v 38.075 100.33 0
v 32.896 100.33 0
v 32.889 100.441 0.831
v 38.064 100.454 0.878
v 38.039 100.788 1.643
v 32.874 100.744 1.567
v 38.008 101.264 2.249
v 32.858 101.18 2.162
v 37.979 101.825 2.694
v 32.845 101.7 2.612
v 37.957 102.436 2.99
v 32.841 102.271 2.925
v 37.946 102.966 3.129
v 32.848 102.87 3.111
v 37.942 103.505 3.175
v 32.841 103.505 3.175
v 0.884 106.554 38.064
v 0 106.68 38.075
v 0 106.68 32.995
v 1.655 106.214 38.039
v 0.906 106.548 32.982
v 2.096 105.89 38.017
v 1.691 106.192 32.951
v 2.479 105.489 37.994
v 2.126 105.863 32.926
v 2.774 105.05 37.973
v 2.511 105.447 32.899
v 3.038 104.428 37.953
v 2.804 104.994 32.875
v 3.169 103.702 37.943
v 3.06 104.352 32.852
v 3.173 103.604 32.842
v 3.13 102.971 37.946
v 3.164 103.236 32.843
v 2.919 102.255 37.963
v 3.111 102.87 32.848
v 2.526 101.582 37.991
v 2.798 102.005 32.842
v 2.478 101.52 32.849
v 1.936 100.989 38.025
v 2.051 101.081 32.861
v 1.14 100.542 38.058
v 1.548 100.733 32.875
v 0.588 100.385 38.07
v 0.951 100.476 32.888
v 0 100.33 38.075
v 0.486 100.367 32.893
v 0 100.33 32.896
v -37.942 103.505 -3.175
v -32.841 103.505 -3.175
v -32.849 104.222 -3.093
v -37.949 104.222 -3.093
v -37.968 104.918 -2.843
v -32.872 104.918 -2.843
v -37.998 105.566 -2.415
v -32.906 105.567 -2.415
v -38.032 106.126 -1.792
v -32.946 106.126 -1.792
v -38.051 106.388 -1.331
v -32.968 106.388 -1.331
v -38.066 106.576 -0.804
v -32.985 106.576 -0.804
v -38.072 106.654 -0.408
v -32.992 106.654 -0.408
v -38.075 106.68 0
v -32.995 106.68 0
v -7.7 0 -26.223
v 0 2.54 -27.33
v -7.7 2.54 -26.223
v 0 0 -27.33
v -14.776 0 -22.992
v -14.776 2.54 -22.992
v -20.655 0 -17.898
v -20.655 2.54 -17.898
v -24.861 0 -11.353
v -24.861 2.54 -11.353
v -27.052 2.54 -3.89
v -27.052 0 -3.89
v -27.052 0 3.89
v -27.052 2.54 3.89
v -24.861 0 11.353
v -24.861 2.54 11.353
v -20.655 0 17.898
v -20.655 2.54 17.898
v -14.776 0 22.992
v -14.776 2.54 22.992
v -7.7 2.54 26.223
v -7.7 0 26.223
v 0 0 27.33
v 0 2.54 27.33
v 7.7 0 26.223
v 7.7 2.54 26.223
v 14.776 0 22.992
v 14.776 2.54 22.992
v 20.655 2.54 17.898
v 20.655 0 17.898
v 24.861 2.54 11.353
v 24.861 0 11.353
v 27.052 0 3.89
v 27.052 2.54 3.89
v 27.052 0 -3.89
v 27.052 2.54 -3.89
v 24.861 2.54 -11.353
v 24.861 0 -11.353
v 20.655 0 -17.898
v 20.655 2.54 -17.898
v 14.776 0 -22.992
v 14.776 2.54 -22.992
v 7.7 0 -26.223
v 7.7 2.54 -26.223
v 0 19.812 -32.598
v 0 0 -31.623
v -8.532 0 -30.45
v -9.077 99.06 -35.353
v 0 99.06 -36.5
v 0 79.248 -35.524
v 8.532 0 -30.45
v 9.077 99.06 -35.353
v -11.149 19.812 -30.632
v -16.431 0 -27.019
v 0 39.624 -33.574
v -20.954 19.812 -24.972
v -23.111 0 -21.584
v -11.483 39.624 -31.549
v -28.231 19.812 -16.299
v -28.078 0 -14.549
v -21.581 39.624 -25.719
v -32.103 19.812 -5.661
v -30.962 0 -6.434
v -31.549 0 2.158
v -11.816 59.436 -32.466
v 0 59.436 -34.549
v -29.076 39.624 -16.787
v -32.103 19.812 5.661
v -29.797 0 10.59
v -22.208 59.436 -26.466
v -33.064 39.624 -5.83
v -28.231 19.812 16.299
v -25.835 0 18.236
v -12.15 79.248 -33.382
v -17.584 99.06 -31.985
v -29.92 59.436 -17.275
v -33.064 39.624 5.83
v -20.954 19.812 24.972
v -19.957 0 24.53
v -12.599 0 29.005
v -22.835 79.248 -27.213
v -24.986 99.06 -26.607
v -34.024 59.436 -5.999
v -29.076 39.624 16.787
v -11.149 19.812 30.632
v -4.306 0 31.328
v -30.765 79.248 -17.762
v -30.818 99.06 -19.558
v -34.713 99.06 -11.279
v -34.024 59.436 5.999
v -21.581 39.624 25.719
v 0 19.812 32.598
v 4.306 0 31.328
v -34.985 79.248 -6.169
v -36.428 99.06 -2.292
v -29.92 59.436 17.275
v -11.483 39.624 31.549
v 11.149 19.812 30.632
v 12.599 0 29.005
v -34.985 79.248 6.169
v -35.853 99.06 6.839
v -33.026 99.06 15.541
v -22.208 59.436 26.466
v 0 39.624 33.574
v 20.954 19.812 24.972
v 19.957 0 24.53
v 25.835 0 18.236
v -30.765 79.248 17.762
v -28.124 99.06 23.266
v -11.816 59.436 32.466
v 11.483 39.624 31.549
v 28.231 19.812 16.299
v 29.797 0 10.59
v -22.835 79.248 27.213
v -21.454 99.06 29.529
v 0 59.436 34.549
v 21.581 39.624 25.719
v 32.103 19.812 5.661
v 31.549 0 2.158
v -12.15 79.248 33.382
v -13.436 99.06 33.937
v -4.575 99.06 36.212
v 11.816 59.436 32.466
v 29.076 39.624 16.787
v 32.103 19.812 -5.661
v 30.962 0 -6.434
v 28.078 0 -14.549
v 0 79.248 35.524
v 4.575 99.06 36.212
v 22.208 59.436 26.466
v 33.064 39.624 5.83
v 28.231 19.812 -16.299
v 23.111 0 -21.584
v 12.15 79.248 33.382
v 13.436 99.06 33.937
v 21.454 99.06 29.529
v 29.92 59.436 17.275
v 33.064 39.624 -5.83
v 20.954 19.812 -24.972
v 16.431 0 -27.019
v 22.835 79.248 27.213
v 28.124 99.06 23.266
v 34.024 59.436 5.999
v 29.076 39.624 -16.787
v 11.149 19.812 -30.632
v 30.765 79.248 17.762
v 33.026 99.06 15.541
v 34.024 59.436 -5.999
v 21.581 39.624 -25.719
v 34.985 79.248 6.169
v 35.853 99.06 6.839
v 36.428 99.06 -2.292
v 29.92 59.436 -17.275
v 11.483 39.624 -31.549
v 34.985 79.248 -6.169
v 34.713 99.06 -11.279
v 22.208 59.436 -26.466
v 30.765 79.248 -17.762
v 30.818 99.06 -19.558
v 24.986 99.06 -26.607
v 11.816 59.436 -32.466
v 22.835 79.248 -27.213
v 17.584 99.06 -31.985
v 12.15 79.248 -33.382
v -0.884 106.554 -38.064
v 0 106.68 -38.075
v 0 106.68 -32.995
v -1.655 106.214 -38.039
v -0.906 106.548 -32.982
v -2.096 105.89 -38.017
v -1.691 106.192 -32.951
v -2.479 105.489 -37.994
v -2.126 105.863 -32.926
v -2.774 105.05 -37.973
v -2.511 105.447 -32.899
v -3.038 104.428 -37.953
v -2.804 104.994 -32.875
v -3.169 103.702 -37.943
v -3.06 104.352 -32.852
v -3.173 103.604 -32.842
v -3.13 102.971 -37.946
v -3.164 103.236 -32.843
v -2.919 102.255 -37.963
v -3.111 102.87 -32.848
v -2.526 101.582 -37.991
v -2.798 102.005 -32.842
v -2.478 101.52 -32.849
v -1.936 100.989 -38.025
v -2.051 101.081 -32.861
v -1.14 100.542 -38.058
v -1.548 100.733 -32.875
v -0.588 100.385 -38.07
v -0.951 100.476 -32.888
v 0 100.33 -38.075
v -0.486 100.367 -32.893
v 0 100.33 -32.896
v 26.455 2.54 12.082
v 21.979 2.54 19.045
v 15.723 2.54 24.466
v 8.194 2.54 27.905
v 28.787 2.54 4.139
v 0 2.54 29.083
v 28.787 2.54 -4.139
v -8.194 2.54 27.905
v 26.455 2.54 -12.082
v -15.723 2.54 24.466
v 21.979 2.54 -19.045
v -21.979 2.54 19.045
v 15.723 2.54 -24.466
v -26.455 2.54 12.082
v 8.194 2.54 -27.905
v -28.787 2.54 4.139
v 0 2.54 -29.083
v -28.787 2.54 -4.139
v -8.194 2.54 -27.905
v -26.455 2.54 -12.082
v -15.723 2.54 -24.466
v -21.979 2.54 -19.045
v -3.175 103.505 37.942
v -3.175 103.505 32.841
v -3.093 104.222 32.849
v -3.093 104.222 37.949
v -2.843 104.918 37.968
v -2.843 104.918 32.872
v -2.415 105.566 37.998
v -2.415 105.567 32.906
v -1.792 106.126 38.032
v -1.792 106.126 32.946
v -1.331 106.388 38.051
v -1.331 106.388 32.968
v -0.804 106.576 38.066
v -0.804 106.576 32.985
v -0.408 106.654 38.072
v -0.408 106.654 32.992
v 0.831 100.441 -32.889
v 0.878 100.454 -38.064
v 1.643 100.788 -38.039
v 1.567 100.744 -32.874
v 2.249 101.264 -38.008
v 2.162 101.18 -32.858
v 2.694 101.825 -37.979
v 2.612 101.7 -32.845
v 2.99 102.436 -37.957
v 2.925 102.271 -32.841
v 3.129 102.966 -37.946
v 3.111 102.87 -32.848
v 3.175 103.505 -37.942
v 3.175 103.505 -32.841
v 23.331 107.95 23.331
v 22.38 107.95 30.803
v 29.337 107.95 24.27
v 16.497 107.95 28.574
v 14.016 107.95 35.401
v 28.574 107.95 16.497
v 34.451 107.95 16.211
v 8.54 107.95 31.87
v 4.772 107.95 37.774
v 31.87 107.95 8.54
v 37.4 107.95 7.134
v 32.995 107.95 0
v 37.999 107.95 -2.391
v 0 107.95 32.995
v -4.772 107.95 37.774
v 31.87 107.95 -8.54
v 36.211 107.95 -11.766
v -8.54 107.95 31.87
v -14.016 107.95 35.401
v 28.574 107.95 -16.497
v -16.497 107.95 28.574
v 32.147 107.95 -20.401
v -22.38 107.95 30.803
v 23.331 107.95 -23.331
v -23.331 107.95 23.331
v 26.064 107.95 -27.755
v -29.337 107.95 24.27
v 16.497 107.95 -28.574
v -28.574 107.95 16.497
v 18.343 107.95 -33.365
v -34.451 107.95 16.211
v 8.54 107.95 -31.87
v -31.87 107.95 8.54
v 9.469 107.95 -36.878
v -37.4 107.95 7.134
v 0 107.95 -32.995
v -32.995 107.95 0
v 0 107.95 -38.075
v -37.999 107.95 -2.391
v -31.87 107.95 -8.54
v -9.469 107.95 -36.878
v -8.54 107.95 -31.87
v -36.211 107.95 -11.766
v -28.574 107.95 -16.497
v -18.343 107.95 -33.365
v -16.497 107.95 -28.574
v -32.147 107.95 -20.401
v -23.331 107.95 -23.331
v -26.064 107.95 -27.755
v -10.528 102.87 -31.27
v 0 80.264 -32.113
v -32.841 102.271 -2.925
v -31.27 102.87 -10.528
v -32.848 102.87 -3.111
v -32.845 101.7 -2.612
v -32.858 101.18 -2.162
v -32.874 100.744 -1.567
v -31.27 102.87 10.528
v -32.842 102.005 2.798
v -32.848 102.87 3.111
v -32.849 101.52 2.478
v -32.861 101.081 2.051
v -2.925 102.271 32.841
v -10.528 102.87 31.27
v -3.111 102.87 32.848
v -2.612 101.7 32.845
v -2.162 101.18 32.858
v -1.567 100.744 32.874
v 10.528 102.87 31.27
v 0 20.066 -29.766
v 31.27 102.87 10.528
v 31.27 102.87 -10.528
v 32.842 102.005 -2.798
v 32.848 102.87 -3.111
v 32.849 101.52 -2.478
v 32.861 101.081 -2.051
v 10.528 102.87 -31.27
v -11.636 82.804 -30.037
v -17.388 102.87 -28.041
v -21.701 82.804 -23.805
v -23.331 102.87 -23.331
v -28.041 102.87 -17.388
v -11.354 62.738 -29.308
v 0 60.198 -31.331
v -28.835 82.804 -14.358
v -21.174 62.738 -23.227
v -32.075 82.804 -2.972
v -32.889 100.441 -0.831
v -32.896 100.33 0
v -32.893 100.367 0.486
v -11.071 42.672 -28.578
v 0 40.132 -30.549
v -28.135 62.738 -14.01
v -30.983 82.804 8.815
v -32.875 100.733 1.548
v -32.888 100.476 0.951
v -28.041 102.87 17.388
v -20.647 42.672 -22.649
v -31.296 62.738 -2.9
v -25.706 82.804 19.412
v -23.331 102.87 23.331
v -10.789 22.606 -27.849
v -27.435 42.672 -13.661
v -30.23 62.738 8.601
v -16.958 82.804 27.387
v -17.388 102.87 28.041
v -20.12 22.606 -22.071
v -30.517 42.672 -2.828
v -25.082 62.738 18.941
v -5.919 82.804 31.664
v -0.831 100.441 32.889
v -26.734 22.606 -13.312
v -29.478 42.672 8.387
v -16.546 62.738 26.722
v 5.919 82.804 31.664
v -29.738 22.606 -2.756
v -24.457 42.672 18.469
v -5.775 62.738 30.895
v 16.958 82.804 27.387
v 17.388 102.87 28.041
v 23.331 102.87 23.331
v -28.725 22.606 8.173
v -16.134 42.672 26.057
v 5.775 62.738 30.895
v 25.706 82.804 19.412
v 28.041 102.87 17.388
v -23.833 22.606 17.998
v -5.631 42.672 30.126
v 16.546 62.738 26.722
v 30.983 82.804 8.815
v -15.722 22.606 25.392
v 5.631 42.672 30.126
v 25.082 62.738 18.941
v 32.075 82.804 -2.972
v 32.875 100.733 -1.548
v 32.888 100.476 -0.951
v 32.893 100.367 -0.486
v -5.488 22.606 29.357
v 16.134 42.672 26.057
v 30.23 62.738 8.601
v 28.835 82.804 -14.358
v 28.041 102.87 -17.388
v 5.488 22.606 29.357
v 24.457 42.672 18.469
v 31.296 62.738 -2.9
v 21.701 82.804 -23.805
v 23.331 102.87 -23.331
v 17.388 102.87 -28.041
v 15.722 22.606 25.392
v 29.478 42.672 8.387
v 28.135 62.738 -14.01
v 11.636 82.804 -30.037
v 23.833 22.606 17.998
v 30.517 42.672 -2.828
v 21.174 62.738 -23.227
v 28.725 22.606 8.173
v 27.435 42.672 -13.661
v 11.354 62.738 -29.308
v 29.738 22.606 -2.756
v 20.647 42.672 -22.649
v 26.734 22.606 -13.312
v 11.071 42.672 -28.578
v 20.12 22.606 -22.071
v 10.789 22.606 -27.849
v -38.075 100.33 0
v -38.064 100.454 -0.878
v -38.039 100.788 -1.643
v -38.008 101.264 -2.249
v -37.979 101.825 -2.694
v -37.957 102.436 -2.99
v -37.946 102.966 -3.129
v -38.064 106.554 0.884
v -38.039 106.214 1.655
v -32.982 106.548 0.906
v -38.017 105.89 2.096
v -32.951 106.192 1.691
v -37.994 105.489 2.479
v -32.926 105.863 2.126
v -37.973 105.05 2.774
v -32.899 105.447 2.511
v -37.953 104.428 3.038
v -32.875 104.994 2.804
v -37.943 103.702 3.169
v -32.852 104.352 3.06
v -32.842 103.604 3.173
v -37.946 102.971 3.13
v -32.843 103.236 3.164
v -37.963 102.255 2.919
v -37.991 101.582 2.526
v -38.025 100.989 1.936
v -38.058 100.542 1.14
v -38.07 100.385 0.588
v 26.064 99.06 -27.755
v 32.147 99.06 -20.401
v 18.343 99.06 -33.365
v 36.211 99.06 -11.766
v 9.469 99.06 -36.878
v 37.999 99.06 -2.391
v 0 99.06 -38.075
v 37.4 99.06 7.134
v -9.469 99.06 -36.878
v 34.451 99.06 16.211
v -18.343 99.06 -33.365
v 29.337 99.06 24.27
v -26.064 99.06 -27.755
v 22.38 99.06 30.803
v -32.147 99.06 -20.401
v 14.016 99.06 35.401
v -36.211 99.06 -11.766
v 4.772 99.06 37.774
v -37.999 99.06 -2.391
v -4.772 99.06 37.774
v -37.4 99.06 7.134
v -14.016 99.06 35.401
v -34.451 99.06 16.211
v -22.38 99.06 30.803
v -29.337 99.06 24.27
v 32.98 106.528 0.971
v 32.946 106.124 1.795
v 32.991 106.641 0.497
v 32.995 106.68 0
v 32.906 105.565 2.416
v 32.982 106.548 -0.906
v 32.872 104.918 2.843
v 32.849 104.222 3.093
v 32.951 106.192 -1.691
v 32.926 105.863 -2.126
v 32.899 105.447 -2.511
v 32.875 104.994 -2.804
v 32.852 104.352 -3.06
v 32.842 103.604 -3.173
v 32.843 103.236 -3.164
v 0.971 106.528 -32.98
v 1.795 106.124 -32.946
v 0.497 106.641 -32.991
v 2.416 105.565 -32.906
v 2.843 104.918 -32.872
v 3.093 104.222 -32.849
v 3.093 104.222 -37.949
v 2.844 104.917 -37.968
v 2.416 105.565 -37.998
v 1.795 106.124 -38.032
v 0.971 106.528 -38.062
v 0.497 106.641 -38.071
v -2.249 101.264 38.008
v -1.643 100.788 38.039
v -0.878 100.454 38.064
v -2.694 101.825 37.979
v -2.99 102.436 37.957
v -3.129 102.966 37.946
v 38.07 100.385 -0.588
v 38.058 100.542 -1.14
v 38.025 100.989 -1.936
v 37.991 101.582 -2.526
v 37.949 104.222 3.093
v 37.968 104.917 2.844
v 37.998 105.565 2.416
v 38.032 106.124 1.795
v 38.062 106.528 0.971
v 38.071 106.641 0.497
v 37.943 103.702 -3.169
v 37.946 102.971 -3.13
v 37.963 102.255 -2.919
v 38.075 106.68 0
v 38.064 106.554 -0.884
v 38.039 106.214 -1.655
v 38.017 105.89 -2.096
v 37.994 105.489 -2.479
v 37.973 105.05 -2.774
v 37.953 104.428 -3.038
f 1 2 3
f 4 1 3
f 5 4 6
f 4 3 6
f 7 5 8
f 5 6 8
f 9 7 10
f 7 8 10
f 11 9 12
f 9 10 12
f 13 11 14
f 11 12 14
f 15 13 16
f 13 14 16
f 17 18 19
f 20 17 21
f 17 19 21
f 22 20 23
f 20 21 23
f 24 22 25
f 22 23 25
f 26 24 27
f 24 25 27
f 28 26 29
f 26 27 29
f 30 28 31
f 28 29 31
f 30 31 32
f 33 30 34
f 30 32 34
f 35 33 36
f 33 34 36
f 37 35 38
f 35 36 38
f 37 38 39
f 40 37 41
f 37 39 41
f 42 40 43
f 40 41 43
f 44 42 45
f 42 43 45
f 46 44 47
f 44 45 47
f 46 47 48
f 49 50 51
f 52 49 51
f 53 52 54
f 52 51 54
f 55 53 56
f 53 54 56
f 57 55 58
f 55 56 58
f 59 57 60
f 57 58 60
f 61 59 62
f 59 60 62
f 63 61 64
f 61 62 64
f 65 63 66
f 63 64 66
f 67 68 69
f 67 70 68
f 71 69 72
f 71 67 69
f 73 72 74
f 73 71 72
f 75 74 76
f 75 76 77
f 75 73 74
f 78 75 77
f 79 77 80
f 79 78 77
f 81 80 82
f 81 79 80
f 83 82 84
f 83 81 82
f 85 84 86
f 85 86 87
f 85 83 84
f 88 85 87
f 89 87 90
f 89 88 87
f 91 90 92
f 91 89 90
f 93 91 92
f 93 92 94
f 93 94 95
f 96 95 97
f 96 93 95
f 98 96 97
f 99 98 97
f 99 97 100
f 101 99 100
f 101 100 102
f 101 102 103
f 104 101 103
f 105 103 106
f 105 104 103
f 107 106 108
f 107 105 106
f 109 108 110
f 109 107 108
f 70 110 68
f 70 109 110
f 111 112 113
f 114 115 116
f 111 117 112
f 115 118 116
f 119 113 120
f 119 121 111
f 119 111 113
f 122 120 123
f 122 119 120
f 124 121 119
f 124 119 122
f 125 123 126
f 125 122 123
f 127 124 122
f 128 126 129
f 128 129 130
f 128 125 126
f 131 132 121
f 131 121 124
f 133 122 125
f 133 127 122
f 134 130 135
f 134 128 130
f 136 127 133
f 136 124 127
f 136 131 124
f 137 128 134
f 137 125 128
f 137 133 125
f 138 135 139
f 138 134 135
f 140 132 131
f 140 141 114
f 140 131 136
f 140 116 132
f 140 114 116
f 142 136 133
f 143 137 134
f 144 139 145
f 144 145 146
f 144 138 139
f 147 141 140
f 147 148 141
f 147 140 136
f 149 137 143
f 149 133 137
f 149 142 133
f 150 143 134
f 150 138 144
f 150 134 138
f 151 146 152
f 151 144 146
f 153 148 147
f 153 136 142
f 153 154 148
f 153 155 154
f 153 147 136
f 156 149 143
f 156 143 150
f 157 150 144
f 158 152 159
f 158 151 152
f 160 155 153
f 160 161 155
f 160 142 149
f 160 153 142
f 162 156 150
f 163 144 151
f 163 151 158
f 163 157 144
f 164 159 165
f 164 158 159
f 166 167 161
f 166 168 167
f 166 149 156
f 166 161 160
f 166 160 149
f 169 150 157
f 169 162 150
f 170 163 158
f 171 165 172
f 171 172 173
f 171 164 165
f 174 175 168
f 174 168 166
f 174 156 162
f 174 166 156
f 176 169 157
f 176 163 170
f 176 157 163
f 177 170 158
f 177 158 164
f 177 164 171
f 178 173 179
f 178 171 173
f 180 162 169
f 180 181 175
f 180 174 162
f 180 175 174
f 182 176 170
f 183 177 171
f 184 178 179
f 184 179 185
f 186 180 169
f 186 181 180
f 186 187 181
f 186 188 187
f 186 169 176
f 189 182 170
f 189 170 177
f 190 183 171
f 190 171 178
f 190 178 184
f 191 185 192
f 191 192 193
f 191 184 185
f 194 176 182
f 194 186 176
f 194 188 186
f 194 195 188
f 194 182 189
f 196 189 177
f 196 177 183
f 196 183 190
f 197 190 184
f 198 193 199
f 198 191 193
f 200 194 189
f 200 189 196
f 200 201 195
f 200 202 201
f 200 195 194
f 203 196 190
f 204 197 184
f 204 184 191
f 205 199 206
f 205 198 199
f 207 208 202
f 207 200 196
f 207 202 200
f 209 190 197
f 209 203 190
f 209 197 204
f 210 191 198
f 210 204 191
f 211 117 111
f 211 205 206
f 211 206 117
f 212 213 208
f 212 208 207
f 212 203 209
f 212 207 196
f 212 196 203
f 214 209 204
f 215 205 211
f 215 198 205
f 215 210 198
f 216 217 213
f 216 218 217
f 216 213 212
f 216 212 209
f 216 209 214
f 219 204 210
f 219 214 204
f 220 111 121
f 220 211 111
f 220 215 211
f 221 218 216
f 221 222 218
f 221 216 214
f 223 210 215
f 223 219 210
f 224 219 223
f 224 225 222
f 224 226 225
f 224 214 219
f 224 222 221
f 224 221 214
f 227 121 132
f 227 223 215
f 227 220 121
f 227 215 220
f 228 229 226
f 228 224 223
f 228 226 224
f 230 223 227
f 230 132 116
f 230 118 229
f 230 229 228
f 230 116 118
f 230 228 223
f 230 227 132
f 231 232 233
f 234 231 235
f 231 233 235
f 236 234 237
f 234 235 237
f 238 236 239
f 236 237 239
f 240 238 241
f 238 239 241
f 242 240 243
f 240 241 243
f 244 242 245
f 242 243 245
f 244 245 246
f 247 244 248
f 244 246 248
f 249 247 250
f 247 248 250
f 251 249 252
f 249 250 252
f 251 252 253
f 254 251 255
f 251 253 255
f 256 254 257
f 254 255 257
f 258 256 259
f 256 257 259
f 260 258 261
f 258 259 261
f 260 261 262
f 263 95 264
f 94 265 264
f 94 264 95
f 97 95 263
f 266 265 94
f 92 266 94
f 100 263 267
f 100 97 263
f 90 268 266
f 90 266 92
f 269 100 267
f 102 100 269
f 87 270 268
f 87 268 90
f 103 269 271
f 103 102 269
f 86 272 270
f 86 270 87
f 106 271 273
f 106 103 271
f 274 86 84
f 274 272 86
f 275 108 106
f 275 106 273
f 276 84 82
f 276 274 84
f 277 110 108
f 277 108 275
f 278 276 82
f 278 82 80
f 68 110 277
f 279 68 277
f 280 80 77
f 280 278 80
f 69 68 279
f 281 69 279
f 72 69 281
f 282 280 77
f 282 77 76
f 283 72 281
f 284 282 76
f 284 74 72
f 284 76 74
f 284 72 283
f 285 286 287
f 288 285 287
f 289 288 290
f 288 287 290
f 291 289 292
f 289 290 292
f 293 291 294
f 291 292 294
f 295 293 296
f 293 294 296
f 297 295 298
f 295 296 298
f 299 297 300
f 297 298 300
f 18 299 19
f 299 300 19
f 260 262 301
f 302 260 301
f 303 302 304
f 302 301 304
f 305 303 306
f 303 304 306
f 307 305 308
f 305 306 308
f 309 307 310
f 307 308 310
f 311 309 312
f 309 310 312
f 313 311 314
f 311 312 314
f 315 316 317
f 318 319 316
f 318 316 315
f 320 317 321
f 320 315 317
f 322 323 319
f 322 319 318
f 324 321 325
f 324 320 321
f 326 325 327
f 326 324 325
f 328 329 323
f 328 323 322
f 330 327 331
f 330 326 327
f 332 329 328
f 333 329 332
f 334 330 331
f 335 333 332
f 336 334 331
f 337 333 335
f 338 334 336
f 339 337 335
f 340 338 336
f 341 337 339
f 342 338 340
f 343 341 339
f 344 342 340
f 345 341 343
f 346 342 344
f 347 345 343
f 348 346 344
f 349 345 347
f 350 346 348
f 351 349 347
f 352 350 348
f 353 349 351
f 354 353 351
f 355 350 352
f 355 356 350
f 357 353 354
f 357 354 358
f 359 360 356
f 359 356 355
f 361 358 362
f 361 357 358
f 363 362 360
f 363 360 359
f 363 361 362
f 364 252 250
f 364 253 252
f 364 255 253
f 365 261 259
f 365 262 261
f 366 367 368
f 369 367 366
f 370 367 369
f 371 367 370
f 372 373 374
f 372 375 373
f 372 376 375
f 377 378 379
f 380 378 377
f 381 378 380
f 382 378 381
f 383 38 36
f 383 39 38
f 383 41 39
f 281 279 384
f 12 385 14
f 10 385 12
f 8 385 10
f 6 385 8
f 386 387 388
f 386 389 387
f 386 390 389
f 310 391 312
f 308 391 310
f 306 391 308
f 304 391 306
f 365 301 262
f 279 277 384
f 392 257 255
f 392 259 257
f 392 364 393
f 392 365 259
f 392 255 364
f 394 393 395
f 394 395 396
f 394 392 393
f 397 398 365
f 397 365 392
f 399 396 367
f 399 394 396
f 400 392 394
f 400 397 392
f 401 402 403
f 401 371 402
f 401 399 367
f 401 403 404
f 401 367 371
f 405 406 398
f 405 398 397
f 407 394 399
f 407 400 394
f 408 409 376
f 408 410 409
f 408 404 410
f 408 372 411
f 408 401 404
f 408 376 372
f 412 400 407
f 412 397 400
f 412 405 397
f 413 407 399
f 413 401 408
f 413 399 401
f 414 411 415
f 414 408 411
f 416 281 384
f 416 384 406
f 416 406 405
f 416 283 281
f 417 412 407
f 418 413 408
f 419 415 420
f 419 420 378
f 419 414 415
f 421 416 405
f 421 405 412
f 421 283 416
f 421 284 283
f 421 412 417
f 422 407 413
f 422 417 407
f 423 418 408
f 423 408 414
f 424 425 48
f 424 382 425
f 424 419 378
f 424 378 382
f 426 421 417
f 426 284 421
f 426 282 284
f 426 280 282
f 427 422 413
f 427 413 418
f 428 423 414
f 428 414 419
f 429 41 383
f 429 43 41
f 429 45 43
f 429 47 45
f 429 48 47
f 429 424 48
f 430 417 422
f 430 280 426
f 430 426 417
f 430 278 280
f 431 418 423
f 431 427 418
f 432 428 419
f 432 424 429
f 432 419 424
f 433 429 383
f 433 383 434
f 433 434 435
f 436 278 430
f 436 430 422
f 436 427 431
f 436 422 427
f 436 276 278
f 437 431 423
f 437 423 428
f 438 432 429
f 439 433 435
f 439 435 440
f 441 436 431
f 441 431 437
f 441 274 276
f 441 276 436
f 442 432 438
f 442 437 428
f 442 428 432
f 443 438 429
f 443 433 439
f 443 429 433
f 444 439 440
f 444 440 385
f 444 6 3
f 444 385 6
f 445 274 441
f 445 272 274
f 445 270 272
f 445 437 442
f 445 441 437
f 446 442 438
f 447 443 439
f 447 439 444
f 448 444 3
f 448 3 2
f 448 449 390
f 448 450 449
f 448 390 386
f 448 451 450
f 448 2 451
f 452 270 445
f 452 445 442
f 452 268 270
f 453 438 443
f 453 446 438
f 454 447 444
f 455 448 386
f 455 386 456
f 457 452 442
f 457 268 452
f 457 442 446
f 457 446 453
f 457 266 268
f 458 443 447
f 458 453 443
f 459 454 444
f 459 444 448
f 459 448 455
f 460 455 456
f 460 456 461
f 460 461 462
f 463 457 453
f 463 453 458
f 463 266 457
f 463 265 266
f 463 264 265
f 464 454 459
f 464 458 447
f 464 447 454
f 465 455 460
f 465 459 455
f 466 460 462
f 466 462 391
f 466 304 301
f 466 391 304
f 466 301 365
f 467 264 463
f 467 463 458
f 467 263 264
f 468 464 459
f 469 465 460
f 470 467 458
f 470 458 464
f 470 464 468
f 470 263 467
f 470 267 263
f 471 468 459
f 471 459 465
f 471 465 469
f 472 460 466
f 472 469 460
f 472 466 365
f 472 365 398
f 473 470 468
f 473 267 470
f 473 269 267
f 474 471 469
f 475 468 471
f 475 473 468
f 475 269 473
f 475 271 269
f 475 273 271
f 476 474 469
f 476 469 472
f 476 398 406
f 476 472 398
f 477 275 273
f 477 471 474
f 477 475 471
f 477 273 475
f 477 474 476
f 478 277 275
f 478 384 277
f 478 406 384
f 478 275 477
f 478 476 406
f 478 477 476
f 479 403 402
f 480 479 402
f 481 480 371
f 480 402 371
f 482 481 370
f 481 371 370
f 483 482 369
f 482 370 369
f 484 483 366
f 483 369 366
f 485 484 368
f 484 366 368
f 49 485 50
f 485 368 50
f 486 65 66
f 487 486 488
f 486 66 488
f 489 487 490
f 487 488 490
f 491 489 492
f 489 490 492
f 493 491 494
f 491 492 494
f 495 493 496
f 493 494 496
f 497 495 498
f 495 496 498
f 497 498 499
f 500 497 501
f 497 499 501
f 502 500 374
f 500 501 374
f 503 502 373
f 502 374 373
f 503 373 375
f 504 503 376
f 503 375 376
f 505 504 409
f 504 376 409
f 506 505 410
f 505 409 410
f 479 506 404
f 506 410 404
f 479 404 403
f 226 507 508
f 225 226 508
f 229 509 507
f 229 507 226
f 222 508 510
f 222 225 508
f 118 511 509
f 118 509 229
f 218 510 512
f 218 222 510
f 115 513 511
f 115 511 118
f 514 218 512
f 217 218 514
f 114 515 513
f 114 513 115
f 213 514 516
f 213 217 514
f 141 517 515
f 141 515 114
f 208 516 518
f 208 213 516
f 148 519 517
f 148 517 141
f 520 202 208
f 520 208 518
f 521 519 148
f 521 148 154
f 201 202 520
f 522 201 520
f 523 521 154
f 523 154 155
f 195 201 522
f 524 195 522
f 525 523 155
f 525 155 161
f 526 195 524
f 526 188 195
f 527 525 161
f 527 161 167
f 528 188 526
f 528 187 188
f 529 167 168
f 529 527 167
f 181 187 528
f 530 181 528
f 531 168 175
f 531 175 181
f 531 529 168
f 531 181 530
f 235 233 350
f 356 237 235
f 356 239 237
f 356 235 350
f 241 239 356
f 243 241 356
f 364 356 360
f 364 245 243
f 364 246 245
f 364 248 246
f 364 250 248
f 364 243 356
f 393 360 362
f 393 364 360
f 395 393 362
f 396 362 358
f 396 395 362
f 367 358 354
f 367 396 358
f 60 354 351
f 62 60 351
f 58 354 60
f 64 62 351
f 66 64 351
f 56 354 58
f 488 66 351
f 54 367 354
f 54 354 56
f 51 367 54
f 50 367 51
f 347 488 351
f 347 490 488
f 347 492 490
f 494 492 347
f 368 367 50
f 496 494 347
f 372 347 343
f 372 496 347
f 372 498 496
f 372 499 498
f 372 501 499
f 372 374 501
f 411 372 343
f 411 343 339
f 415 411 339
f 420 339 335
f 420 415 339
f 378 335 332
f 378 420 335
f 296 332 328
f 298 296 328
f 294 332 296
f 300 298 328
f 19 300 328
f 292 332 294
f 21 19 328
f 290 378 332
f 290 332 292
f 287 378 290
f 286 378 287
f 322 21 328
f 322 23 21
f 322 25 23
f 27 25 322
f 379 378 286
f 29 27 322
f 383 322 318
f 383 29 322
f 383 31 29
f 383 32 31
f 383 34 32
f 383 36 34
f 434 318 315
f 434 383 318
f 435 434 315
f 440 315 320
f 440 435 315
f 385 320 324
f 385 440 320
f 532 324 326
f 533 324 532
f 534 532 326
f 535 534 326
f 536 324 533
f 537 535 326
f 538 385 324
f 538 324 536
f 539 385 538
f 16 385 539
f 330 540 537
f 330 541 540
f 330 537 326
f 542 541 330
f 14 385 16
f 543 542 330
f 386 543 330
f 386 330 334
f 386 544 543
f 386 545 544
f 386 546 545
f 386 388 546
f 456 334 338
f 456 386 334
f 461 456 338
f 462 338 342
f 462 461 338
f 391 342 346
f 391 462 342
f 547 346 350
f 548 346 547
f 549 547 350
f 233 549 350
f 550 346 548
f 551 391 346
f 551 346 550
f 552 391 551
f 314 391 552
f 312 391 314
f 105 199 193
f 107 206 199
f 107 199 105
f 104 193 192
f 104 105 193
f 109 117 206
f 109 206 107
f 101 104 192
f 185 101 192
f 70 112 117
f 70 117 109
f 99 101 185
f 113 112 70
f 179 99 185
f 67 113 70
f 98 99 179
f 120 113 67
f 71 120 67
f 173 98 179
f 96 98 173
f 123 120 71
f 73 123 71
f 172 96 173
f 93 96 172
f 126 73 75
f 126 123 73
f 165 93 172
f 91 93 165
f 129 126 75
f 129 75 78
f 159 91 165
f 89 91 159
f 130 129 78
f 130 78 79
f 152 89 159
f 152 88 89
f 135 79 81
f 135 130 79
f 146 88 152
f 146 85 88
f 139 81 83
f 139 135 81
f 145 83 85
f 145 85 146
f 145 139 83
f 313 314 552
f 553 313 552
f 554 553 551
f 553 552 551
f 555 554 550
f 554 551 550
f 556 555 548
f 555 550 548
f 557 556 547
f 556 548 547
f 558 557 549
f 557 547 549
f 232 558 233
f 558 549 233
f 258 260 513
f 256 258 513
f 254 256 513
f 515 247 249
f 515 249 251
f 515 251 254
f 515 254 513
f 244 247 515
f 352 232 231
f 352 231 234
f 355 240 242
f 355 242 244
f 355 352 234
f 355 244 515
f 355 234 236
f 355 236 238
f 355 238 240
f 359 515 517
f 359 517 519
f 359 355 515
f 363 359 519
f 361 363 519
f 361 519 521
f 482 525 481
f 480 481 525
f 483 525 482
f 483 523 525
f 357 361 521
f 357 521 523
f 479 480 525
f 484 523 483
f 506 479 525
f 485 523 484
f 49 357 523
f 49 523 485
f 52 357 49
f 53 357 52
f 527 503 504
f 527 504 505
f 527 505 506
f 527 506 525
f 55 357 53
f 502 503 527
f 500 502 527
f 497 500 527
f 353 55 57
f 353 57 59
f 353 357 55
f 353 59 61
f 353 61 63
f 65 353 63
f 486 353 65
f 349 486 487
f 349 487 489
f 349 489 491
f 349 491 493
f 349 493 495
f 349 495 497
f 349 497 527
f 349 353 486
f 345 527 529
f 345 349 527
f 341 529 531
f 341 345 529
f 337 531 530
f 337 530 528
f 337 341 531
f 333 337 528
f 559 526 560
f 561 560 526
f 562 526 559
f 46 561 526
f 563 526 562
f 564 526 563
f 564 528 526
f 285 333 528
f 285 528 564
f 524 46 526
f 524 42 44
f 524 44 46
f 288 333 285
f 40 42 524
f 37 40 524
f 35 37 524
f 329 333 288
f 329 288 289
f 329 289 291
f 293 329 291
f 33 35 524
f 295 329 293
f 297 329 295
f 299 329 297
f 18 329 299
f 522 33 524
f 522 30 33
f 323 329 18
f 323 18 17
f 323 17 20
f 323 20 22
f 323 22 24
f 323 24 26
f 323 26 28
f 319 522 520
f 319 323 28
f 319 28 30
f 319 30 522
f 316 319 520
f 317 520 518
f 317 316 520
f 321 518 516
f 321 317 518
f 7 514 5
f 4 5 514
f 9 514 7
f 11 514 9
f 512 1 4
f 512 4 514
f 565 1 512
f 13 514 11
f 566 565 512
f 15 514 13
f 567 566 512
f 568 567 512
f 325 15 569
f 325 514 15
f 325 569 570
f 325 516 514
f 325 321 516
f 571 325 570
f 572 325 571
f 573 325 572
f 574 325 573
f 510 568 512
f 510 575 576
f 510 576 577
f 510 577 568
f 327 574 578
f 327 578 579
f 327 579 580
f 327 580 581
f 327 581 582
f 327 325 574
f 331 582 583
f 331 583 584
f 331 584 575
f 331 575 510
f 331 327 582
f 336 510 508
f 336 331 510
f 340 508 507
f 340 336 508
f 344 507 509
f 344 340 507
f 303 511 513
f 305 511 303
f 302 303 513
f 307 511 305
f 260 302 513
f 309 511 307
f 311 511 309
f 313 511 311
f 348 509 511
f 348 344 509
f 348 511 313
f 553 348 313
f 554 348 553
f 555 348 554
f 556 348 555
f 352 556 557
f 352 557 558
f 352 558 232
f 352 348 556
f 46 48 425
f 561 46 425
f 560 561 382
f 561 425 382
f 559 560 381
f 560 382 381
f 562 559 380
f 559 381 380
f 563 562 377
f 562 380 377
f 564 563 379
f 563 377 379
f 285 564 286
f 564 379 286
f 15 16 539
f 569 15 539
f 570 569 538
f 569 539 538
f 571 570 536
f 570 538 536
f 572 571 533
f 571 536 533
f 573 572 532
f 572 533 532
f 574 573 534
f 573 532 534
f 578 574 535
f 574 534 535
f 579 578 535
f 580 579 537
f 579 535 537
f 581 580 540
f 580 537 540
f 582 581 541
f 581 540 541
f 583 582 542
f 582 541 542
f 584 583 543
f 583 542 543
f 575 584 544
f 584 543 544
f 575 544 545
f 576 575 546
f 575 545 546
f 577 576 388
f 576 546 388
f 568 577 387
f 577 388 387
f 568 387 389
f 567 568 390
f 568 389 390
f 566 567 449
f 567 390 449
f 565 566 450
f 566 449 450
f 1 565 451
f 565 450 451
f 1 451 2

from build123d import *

# Parameters (mm, degrees)
CUT_EXTRUDE2_DEPTH = 45.212
CIRPATTERN2_COUNT  = 4


with BuildPart() as part:
    # Sketch2 → Revolve2 (revolve)
    with BuildSketch(Plane.XY, mode=Mode.PRIVATE) as revolve2_sk:
        Polygon((27.3304, 2.54), (27.3304, 0), (31.623, 0), (36.4998, 99.06), (38.0746, 99.06), (38.0746, 107.95), (32.9946, 107.95), (32.9946, 102.87), (29.083, 2.54), align=None)
    revolve(revolve2_sk.sketch.rotate(Axis((0, 0, 0), (0, 1, 0)), 90), axis=Axis((0, 0, 0), (0, 1, 0)))

    # Sketch5 → Cut-Extrude2 (cut)
    with BuildSketch(Plane.XY):
        with BuildLine():
            ThreePointArc((3.175, 103.505), (2.24506403, 105.75006403), (0, 106.68))
            Line((0, 106.68), (0, 100.33))
            ThreePointArc((0, 100.33), (2.24506403, 101.25993597), (3.175, 103.505))
        make_face()
        with BuildLine():
            Line((0, 100.33), (0, 106.68))
            ThreePointArc((0, 106.68), (-3.175, 103.505), (0, 100.33))
        make_face()
    cut_extrude2 = extrude(amount=-CUT_EXTRUDE2_DEPTH, mode=Mode.SUBTRACT)

    # CirPattern2: Cut-Extrude2 ×4 about axis
    cirpattern2_axis = Axis((0, 0, 0), (0, -1, 0))
    for i in range(1, CIRPATTERN2_COUNT):
        add(cut_extrude2.rotate(cirpattern2_axis, i * 360 / CIRPATTERN2_COUNT), mode=Mode.SUBTRACT)


solid = part.part
